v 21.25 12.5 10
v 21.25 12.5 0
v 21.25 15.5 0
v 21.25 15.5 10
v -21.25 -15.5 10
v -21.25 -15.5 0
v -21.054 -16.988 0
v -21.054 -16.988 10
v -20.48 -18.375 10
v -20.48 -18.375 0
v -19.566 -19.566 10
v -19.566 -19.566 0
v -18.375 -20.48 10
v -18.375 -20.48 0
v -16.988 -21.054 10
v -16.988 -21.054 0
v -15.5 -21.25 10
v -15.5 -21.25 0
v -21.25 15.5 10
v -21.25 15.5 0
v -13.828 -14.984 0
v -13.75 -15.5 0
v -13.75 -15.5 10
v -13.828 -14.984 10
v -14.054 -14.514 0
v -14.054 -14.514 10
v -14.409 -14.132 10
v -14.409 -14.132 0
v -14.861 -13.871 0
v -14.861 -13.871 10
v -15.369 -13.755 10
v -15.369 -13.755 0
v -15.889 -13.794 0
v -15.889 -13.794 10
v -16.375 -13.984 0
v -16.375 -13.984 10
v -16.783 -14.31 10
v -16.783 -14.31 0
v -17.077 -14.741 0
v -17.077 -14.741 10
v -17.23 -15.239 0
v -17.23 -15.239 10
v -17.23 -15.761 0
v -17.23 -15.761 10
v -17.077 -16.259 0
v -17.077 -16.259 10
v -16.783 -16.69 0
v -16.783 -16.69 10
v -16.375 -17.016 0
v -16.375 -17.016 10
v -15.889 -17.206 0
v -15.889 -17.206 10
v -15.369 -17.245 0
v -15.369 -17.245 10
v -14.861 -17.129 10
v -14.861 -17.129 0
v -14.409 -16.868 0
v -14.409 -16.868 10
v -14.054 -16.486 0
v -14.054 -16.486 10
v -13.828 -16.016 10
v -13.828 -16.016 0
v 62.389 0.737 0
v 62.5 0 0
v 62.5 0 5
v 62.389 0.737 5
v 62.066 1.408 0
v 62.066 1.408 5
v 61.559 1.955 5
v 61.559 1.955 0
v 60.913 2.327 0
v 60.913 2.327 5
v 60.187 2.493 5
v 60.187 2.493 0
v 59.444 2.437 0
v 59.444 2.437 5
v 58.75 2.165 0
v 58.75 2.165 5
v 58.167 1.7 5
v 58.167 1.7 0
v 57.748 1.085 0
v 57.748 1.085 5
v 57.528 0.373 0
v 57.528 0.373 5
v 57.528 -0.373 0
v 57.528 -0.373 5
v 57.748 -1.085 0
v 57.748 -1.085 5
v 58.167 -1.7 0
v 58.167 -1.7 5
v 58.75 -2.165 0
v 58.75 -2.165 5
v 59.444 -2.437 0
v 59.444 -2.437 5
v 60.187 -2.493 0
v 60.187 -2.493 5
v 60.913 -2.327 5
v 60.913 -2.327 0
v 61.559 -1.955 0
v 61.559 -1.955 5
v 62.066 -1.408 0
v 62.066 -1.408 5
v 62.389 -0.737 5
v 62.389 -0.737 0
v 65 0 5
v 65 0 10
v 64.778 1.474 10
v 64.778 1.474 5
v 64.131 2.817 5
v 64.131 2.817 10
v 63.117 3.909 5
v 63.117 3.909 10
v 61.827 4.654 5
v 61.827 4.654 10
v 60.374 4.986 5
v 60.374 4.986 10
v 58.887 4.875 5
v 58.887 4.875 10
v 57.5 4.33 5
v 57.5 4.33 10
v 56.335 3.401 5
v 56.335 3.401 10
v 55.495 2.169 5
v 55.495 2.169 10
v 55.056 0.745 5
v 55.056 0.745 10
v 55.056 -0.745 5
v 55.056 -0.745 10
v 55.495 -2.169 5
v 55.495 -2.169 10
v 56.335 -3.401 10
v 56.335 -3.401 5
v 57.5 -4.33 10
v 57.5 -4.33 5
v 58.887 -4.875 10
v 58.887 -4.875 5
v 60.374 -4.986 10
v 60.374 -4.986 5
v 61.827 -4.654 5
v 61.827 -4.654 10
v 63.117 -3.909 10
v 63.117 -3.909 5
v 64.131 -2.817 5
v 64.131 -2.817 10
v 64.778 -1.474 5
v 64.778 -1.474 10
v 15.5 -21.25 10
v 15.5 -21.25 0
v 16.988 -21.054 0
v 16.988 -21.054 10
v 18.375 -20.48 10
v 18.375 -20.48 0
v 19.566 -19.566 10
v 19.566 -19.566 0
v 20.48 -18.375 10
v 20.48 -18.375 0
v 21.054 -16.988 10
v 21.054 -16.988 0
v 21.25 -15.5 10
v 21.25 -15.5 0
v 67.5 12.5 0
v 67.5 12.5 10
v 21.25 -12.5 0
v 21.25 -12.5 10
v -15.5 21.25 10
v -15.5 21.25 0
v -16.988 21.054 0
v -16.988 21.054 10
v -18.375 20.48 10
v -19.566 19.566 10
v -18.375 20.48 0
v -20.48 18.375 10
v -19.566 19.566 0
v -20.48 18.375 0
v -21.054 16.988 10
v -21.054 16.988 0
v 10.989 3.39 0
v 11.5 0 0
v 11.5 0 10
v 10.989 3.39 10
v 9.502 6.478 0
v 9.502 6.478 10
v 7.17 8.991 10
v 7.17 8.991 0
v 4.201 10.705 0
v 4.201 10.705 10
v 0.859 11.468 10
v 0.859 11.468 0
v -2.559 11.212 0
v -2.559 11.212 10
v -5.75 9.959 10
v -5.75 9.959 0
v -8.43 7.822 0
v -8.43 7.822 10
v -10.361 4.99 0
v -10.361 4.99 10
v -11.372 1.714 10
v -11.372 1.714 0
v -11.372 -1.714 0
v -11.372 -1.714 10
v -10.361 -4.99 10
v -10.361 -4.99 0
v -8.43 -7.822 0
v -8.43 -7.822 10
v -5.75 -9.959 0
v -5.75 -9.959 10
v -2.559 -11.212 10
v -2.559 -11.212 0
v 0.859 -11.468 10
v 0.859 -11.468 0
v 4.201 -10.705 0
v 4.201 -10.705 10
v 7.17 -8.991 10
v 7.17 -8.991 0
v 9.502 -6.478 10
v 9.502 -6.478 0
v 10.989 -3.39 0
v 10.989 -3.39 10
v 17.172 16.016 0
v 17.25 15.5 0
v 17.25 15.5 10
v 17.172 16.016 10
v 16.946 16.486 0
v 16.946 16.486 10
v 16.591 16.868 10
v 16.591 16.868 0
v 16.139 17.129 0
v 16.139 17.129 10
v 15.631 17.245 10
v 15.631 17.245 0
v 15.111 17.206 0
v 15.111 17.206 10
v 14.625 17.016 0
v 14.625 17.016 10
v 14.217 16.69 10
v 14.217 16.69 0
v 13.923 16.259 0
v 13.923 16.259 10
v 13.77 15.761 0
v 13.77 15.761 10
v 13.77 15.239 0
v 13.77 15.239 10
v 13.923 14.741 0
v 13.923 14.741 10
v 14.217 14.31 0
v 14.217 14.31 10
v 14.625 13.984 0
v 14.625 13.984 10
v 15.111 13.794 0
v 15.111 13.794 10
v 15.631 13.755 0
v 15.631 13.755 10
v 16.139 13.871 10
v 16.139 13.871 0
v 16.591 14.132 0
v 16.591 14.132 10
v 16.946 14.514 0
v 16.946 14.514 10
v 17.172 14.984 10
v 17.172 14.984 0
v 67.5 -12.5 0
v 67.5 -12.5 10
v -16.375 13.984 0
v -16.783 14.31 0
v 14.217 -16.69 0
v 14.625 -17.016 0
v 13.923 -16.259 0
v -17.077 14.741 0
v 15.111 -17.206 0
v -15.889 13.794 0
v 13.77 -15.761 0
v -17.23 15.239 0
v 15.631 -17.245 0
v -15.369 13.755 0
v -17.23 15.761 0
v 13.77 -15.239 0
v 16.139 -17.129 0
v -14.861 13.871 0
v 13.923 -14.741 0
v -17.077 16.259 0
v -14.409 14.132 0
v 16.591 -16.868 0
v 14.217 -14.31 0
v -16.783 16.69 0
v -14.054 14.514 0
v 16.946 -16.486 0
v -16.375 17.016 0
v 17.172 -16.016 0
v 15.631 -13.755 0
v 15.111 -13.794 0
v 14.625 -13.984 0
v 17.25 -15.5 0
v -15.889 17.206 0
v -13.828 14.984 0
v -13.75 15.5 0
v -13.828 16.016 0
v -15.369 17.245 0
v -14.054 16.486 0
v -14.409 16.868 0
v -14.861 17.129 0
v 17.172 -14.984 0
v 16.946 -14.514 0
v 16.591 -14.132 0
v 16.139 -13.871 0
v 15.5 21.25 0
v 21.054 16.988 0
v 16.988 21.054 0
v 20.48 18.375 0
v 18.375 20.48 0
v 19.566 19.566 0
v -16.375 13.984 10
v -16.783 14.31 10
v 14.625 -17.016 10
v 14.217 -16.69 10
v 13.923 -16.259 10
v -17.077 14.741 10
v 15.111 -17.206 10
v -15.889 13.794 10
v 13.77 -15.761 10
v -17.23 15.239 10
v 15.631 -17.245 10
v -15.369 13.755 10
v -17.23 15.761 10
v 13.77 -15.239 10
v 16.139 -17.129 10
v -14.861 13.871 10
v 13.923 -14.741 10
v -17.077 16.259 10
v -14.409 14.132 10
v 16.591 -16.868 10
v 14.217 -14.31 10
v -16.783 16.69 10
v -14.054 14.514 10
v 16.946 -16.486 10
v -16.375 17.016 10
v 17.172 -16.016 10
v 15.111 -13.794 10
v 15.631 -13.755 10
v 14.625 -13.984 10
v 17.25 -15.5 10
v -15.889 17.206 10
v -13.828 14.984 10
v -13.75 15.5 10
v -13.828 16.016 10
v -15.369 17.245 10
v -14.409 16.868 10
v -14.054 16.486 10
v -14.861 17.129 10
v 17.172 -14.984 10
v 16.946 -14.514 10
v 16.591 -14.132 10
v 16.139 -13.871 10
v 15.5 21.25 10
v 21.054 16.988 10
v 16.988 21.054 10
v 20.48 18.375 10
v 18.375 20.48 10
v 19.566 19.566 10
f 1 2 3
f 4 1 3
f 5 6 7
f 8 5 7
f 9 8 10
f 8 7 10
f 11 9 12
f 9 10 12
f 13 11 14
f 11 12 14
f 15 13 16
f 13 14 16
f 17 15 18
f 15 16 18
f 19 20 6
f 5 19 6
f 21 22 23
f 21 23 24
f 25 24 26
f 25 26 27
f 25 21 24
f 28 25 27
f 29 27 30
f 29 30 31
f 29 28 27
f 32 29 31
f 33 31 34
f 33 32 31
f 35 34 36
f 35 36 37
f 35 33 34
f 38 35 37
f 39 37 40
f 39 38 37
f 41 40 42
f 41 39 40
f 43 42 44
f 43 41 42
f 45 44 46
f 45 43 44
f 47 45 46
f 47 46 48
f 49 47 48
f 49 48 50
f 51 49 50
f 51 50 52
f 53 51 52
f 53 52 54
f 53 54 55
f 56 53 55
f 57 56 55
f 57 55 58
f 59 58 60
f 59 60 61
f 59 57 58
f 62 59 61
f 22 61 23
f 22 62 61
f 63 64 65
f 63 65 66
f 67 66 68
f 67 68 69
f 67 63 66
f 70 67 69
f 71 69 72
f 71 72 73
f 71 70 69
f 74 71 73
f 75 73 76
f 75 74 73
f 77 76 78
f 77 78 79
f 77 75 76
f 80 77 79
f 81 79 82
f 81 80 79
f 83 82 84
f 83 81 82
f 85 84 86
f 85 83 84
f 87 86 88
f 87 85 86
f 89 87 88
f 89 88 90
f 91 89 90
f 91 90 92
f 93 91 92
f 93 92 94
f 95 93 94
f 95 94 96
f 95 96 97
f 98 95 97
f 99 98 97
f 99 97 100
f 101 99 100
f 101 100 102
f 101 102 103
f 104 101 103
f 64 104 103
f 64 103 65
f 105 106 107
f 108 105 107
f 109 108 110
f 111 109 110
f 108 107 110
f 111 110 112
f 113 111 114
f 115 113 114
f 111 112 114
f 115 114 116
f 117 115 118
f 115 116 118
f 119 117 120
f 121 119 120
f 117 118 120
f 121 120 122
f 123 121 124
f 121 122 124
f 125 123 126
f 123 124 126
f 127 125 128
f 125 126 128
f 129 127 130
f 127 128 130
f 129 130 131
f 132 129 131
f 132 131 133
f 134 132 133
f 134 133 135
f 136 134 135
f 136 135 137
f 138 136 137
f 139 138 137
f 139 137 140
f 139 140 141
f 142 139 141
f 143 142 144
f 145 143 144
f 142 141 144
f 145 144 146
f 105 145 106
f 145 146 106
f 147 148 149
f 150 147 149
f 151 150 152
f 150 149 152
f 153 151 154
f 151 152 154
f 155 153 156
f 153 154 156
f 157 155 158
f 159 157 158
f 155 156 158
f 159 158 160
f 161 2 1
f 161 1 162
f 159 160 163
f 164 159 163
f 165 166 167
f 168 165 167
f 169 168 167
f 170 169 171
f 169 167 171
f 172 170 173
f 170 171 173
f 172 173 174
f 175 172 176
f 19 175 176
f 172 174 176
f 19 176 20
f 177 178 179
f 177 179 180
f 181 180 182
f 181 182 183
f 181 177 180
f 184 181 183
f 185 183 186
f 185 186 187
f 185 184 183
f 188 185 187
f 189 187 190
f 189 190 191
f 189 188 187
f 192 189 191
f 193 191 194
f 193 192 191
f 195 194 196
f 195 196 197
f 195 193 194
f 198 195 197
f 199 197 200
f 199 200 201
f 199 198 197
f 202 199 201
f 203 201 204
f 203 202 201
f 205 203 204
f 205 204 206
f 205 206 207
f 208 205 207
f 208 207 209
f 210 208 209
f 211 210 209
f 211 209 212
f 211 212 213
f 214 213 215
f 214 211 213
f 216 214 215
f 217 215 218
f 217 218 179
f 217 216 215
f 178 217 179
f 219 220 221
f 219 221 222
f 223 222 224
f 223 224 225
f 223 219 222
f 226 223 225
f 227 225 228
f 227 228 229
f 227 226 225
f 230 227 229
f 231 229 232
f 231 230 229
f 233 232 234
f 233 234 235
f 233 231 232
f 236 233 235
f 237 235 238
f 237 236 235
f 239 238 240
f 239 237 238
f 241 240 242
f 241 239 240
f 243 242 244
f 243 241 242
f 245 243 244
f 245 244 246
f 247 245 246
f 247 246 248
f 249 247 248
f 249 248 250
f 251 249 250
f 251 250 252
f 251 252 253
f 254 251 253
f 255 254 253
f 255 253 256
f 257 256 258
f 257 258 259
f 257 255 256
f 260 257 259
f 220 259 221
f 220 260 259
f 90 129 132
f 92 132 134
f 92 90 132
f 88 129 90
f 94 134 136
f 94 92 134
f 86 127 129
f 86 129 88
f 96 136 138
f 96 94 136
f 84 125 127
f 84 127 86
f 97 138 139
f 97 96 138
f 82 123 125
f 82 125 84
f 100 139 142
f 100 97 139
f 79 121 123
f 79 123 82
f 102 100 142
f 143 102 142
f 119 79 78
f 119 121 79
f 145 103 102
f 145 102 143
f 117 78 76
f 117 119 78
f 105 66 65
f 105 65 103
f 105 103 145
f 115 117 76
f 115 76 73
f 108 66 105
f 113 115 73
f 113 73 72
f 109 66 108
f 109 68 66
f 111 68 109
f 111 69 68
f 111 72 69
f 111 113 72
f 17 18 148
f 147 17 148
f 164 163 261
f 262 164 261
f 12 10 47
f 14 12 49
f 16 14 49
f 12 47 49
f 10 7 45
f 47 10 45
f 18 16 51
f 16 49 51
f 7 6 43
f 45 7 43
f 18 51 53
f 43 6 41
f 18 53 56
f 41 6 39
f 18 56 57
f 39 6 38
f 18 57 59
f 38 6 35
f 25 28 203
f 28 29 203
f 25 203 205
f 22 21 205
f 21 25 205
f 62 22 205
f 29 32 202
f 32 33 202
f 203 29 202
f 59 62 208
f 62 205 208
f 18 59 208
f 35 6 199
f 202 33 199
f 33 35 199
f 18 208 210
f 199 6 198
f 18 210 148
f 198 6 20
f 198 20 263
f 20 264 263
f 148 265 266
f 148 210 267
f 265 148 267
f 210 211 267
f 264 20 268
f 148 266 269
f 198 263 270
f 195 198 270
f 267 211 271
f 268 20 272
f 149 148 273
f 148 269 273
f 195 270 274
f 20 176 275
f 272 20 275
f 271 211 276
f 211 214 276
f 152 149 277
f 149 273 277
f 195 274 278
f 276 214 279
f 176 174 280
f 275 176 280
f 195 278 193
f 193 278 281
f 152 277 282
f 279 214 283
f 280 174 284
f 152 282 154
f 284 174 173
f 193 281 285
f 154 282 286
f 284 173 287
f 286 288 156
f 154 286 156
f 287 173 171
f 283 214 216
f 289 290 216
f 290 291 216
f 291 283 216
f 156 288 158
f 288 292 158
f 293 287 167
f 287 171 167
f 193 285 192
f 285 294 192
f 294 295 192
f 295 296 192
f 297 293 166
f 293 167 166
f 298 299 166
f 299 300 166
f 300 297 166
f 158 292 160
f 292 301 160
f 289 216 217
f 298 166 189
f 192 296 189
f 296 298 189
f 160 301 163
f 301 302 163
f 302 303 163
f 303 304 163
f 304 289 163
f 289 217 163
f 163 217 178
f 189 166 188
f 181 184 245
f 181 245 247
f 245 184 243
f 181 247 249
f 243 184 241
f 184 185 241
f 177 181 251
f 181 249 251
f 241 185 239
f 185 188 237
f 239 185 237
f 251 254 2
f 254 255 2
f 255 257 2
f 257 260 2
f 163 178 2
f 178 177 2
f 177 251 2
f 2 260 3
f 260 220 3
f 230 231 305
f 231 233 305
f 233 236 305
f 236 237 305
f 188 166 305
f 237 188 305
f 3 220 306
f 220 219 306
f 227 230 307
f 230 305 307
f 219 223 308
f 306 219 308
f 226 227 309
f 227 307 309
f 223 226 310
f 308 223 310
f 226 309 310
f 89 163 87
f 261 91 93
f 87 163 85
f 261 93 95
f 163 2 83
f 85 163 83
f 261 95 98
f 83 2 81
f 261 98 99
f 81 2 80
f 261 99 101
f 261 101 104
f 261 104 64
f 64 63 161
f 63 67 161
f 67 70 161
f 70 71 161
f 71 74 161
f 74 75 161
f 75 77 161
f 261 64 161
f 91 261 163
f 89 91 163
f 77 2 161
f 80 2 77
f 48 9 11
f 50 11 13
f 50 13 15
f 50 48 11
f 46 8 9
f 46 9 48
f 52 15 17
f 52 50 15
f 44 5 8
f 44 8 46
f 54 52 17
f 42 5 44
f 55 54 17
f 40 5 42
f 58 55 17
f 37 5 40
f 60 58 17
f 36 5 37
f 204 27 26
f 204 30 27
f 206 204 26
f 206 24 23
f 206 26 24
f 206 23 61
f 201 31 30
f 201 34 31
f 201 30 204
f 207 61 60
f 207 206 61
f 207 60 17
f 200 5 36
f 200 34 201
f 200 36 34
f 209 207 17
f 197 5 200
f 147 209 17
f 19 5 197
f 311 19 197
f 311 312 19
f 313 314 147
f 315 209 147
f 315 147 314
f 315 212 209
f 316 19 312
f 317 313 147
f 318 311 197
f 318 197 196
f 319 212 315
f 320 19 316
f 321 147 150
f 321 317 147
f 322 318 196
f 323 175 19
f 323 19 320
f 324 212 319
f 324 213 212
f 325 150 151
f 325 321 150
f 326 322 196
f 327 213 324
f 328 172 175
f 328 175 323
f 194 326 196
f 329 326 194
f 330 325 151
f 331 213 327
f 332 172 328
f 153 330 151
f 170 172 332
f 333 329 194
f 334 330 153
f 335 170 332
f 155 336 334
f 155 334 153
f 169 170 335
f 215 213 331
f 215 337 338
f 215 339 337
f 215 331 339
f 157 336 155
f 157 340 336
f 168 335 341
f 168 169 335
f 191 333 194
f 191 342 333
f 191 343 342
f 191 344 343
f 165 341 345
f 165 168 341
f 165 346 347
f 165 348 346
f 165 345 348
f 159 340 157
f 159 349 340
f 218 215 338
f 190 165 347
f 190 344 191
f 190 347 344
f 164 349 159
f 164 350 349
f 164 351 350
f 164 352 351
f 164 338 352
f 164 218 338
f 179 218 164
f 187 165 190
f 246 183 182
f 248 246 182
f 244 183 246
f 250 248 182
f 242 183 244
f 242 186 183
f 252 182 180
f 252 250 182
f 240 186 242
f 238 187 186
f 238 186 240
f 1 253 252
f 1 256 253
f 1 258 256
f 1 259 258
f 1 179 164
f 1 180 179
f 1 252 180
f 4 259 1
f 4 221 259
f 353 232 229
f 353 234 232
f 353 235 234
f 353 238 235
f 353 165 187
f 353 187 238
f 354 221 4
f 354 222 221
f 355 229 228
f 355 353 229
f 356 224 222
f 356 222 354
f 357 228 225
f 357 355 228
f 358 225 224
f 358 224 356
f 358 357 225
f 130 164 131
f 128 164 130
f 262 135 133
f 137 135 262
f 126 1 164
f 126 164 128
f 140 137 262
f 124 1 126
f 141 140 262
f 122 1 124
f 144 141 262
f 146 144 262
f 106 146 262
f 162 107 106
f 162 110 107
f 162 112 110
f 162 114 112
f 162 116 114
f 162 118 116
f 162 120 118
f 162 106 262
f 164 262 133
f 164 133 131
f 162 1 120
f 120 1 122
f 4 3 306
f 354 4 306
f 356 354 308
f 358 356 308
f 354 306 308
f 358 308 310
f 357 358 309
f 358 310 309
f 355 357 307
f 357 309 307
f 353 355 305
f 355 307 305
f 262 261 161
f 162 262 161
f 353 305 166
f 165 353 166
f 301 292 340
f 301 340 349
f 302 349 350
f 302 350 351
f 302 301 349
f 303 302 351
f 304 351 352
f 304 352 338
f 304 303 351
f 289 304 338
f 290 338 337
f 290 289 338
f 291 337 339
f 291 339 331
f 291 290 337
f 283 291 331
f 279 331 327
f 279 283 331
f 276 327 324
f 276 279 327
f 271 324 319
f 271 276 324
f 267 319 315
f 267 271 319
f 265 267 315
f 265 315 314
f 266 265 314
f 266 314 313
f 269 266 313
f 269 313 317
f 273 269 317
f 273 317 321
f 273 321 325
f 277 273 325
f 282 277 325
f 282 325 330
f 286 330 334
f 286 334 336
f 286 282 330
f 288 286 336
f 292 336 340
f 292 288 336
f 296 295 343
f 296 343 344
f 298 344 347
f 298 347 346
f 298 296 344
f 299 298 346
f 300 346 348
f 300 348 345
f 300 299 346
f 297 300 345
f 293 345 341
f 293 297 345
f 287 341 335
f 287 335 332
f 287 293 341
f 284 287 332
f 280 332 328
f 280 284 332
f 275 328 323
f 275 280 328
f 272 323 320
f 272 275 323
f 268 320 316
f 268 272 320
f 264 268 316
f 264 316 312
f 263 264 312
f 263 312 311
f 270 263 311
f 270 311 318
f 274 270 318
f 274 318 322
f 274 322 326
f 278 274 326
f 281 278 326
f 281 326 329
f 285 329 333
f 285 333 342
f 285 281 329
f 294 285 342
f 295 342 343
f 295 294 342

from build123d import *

# Parameters (mm, degrees)
F0_R     = 11.5
F0_R_2   = 1.75
F0_W     = 46.25
F0_H     = 25
F0_R_3   = 2.5
F1_DEPTH = 10
F2_R     = 5
F2_R_2   = 2.5
F3_DEPTH = 5


# Not quite as in the source:
# - a feature names something its author has since deleted; it is built from what else it names


with BuildPart() as f1:
    # F0 (on Top) → F1 (new body)
    with BuildSketch(Plane.XY):
        with BuildLine():
            Line((15.5000000202, 21.25), (-15.5, 21.25))
            ThreePointArc((-15.5, 21.25), (-11.4341360082, 19.5658639918), (-9.75, 15.5))
            ThreePointArc((-9.75, 15.5), (-15.5, 9.75), (-21.25, 15.5))
            Line((-21.25, 15.5), (-21.25, -15.4999999845))
            ThreePointArc((-21.25, -15.4999999845), (-15.4999999923, -9.75), (-9.75, -15.5))
            ThreePointArc((-9.75, -15.5), (-11.4341360082, -19.5658639918), (-15.5, -21.25))
            Line((-15.5, -21.25), (15.4999999923, -21.25))
            ThreePointArc((15.4999999923, -21.25), (11.4341360109, -11.4341360054), (21.25, -15.5))
            Line((21.25, -15.5), (21.25, -12.5))
            Line((21.25, -12.5), (21.25, 12.5))
            Line((21.25, 12.5), (21.25, 15.5))
            ThreePointArc((21.25, 15.5), (11.434136001, 11.4341360153), (15.5000000202, 21.25))
        make_face()
        Circle(F0_R, mode=Mode.SUBTRACT)
        with BuildLine():
            ThreePointArc((-9.75, -15.5), (-15.4999999923, -9.75), (-21.25, -15.4999999845))
            ThreePointArc((-21.25, -15.4999999845), (-19.5658639973, -19.5658639864), (-15.5, -21.25))
            ThreePointArc((-15.5, -21.25), (-11.4341360082, -19.5658639918), (-9.75, -15.5))
        make_face()
        with Locations((-15.5, -15.5)):
            Circle(F0_R_2, mode=Mode.SUBTRACT)
        with BuildLine():
            ThreePointArc((-9.75, 15.5), (-11.4341360082, 19.5658639918), (-15.5, 21.25))
            ThreePointArc((-15.5, 21.25), (-19.5658639918, 19.5658639918), (-21.25, 15.5))
            ThreePointArc((-21.25, 15.5), (-15.5, 9.75), (-9.75, 15.5))
        make_face()
        with Locations((-15.5, 15.5)):
            Circle(F0_R_2, mode=Mode.SUBTRACT)
        with BuildLine():
            ThreePointArc((21.25, 15.5), (19.565863999, 19.5658639847), (15.5000000202, 21.25))
            ThreePointArc((15.5000000202, 21.25), (11.434136001, 11.4341360153), (21.25, 15.5))
        make_face()
        with Locations((15.5, 15.5)):
            Circle(F0_R_2, mode=Mode.SUBTRACT)
        with BuildLine():
            ThreePointArc((21.25, -15.5), (11.4341360109, -11.4341360054), (15.4999999923, -21.25))
            ThreePointArc((15.4999999923, -21.25), (19.5658639891, -19.5658639946), (21.25, -15.5))
        make_face()
        with Locations((15.5, -15.5)):
            Circle(F0_R_2, mode=Mode.SUBTRACT)
        with Locations((44.375, 0)):
            Rectangle(F0_W, F0_H)
        with Locations((60, 0)):
            Circle(F0_R_3, mode=Mode.SUBTRACT)
    extrude(amount=F1_DEPTH)

    # F2 (on face) → F3 (cut)
    with BuildSketch(Plane.XY.offset(10)):
        with Locations((60, 0)):
            Circle(F2_R)
        with Locations((60, 0)):
            Circle(F2_R_2, mode=Mode.SUBTRACT)
    extrude(amount=-F3_DEPTH, mode=Mode.SUBTRACT)


solid = f1.part
